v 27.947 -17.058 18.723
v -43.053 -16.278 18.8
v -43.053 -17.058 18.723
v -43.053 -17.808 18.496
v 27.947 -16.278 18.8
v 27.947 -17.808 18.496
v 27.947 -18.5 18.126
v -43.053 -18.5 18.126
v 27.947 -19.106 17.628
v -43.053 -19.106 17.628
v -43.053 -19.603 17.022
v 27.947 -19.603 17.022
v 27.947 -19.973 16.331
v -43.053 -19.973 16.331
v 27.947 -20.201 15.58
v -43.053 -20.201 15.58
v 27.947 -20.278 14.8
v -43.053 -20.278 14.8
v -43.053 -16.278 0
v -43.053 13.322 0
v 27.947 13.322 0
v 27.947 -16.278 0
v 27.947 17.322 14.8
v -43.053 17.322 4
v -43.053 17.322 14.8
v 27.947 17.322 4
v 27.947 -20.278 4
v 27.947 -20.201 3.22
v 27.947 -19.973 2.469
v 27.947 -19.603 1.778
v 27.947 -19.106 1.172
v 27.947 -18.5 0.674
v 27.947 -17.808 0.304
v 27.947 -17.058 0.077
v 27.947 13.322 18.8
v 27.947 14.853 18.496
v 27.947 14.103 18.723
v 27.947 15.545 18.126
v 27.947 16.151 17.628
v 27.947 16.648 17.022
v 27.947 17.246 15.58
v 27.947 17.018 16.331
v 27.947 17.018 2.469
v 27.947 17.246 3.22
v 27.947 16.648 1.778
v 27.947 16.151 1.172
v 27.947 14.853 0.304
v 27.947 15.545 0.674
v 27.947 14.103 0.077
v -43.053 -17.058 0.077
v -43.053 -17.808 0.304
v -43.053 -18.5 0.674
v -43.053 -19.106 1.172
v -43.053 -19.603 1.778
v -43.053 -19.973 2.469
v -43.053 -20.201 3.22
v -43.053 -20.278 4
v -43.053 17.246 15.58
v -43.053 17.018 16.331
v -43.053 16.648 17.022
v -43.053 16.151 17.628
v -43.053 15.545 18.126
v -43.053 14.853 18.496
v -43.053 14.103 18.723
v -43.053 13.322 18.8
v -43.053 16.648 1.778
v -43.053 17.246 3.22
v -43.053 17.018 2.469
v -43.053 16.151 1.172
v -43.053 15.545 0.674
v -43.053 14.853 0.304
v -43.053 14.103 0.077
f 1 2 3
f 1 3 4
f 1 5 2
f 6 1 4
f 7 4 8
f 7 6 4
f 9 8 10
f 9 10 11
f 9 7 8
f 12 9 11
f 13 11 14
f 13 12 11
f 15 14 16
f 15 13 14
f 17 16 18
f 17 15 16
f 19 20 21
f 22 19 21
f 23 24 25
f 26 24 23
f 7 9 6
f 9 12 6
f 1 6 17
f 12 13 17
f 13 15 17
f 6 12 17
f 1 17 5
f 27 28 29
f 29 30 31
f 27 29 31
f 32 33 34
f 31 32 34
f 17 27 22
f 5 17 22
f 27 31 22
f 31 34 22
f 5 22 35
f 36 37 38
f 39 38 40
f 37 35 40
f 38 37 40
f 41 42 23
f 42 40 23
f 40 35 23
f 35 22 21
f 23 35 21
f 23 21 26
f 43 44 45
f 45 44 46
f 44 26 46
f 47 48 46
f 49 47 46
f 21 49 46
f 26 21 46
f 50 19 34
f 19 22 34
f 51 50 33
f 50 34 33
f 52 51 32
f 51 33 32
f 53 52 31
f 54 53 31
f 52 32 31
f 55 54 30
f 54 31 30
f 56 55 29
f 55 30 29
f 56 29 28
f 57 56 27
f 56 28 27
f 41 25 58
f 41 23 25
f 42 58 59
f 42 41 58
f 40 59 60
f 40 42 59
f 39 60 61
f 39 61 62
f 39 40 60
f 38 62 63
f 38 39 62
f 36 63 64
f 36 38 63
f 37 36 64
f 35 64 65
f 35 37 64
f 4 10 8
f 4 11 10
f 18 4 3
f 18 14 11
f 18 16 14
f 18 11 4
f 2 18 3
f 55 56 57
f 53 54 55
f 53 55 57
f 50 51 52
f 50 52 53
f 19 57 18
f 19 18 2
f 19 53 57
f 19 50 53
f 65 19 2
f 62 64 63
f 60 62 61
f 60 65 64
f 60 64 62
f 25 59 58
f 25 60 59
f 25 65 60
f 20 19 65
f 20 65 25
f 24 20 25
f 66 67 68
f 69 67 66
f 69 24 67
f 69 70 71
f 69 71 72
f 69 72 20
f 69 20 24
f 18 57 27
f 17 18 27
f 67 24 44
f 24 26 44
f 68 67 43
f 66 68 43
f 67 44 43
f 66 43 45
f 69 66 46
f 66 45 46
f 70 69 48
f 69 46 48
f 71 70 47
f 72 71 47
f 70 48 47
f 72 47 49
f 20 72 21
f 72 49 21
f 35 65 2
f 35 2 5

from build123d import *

# Parameters (mm, degrees)
ESQUISSE1_W      = 71
ESQUISSE1_H      = 37.6
EXTRUSION1_DEPTH = 18.8
CONG_1_R         = 4
CONG_2_R         = 4
CONG_3_R         = 4


with BuildPart() as part:
    # Esquisse1 → Extrusion1 (new body)
    with BuildSketch(Plane.XY):
        with Locations((-7.553014699, -1.477523911)):
            Rectangle(ESQUISSE1_W, ESQUISSE1_H)
    extrude(amount=EXTRUSION1_DEPTH)

    # Congé1
    cong_1_edges = [part.edges().sort_by_distance(p)[0] for p in [
        (-7.553014699, 17.322476089, 18.8),
    ]]
    fillet(cong_1_edges, radius=CONG_1_R)

    # Congé2
    cong_2_edges = [part.edges().sort_by_distance(p)[0] for p in [
        (-7.553014699, -20.277523911, 18.8),
        (-7.553014699, 17.322476089, 0),
    ]]
    fillet(cong_2_edges, radius=CONG_2_R)

    # Congé3
    cong_3_edges = [part.edges().sort_by_distance(p)[0] for p in [
        (-7.553014699, -20.277523911, 0),
    ]]
    fillet(cong_3_edges, radius=CONG_3_R)


solid = part.part
